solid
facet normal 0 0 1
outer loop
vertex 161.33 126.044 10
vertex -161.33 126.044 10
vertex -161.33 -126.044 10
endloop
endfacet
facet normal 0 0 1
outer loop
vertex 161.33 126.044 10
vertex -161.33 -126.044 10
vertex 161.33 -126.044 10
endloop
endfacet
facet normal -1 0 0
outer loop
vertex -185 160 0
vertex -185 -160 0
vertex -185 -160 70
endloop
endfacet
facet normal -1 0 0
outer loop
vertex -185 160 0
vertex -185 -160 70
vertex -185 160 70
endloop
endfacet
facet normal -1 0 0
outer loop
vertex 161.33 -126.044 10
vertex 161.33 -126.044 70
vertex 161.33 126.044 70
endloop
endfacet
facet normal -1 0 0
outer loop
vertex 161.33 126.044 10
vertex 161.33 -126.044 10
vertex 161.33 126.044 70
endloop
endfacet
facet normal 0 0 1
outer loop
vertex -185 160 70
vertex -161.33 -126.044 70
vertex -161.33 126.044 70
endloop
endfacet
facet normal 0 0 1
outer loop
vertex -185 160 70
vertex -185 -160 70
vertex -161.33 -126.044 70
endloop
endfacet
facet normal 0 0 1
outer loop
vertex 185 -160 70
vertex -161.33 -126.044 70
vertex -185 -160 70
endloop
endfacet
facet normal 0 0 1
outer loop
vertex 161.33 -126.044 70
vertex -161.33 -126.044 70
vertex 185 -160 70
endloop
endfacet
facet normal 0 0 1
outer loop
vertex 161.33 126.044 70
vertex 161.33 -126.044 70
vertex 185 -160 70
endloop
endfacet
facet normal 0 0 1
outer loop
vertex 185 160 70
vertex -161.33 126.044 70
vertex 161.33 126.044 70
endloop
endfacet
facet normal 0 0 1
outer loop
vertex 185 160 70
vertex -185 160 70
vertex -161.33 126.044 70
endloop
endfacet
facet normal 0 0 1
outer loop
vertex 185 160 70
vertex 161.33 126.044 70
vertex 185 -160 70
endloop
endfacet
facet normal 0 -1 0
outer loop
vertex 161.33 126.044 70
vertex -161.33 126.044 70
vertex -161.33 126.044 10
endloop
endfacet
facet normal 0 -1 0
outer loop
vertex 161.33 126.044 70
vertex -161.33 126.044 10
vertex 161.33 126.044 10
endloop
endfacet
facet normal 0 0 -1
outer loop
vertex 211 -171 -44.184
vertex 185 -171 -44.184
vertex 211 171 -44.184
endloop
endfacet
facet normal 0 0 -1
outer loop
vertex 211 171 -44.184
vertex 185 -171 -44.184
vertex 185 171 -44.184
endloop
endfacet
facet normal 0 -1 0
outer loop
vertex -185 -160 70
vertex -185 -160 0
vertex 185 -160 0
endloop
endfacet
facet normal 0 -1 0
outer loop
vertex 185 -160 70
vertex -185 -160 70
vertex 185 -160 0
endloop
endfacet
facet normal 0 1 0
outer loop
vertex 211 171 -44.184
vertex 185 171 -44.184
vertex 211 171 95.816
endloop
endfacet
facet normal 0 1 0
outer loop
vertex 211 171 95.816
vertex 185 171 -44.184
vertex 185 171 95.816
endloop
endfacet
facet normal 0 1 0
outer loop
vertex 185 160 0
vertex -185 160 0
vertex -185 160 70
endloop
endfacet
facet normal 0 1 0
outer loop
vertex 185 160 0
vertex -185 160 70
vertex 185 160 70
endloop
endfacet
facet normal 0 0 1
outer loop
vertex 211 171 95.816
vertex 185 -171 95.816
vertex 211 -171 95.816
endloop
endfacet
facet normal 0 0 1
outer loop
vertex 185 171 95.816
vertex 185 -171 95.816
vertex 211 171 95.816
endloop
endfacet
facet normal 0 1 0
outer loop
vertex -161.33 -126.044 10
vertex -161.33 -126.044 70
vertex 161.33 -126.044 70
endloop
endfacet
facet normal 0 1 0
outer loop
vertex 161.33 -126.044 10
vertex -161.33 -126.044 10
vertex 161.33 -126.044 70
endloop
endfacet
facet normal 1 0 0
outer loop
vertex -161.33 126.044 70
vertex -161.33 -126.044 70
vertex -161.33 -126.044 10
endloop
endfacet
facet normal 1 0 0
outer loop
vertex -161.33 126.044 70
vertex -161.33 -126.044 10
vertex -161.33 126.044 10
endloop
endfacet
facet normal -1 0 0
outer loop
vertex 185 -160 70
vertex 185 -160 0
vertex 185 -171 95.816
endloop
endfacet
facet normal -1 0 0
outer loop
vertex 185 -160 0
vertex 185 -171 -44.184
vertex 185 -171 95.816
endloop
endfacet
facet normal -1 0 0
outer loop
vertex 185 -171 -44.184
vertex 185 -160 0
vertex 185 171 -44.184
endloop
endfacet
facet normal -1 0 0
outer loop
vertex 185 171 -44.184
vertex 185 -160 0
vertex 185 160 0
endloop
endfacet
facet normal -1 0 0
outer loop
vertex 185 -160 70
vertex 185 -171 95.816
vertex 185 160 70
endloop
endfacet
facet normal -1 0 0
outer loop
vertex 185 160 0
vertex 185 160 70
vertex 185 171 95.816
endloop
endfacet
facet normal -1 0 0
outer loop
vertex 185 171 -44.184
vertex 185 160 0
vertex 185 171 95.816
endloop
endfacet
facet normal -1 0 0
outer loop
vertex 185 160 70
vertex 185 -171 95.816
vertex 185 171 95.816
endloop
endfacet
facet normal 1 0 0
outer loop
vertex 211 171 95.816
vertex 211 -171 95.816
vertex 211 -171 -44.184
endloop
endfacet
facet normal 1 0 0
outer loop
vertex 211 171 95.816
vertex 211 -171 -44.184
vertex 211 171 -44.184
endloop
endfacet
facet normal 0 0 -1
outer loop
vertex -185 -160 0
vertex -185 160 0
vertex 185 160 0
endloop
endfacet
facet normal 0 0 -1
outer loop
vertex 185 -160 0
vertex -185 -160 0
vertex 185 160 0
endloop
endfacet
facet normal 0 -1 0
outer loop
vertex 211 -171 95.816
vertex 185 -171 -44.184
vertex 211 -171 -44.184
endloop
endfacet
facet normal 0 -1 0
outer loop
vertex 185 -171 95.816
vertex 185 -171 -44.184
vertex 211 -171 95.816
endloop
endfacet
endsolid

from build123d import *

# Parameters (mm, degrees)
F0_W     = 370
F0_H     = 320
F1_DEPTH = 70
F2_W     = 322.659016
F2_H     = 252.088964
F3_DEPTH = 60
F4_W     = 342
F4_H     = 140
F5_DEPTH = 26


with BuildPart() as f1:
    # F0 (on Top) → F1 (new body)
    with BuildSketch(Plane.XY):
        Rectangle(F0_W, F0_H)
    extrude(amount=F1_DEPTH)

    # F2 (on face) → F3 (cut)
    with BuildSketch(Plane.XY.offset(70)):
        Rectangle(F2_W, F2_H)
    extrude(amount=-F3_DEPTH, mode=Mode.SUBTRACT)

    # F4 (on face) → F5 (join)
    with BuildSketch(Plane.YZ.offset(185)):
        with Locations((0, 25.815584)):
            Rectangle(F4_W, F4_H)
    extrude(amount=F5_DEPTH)


solid = f1.part
